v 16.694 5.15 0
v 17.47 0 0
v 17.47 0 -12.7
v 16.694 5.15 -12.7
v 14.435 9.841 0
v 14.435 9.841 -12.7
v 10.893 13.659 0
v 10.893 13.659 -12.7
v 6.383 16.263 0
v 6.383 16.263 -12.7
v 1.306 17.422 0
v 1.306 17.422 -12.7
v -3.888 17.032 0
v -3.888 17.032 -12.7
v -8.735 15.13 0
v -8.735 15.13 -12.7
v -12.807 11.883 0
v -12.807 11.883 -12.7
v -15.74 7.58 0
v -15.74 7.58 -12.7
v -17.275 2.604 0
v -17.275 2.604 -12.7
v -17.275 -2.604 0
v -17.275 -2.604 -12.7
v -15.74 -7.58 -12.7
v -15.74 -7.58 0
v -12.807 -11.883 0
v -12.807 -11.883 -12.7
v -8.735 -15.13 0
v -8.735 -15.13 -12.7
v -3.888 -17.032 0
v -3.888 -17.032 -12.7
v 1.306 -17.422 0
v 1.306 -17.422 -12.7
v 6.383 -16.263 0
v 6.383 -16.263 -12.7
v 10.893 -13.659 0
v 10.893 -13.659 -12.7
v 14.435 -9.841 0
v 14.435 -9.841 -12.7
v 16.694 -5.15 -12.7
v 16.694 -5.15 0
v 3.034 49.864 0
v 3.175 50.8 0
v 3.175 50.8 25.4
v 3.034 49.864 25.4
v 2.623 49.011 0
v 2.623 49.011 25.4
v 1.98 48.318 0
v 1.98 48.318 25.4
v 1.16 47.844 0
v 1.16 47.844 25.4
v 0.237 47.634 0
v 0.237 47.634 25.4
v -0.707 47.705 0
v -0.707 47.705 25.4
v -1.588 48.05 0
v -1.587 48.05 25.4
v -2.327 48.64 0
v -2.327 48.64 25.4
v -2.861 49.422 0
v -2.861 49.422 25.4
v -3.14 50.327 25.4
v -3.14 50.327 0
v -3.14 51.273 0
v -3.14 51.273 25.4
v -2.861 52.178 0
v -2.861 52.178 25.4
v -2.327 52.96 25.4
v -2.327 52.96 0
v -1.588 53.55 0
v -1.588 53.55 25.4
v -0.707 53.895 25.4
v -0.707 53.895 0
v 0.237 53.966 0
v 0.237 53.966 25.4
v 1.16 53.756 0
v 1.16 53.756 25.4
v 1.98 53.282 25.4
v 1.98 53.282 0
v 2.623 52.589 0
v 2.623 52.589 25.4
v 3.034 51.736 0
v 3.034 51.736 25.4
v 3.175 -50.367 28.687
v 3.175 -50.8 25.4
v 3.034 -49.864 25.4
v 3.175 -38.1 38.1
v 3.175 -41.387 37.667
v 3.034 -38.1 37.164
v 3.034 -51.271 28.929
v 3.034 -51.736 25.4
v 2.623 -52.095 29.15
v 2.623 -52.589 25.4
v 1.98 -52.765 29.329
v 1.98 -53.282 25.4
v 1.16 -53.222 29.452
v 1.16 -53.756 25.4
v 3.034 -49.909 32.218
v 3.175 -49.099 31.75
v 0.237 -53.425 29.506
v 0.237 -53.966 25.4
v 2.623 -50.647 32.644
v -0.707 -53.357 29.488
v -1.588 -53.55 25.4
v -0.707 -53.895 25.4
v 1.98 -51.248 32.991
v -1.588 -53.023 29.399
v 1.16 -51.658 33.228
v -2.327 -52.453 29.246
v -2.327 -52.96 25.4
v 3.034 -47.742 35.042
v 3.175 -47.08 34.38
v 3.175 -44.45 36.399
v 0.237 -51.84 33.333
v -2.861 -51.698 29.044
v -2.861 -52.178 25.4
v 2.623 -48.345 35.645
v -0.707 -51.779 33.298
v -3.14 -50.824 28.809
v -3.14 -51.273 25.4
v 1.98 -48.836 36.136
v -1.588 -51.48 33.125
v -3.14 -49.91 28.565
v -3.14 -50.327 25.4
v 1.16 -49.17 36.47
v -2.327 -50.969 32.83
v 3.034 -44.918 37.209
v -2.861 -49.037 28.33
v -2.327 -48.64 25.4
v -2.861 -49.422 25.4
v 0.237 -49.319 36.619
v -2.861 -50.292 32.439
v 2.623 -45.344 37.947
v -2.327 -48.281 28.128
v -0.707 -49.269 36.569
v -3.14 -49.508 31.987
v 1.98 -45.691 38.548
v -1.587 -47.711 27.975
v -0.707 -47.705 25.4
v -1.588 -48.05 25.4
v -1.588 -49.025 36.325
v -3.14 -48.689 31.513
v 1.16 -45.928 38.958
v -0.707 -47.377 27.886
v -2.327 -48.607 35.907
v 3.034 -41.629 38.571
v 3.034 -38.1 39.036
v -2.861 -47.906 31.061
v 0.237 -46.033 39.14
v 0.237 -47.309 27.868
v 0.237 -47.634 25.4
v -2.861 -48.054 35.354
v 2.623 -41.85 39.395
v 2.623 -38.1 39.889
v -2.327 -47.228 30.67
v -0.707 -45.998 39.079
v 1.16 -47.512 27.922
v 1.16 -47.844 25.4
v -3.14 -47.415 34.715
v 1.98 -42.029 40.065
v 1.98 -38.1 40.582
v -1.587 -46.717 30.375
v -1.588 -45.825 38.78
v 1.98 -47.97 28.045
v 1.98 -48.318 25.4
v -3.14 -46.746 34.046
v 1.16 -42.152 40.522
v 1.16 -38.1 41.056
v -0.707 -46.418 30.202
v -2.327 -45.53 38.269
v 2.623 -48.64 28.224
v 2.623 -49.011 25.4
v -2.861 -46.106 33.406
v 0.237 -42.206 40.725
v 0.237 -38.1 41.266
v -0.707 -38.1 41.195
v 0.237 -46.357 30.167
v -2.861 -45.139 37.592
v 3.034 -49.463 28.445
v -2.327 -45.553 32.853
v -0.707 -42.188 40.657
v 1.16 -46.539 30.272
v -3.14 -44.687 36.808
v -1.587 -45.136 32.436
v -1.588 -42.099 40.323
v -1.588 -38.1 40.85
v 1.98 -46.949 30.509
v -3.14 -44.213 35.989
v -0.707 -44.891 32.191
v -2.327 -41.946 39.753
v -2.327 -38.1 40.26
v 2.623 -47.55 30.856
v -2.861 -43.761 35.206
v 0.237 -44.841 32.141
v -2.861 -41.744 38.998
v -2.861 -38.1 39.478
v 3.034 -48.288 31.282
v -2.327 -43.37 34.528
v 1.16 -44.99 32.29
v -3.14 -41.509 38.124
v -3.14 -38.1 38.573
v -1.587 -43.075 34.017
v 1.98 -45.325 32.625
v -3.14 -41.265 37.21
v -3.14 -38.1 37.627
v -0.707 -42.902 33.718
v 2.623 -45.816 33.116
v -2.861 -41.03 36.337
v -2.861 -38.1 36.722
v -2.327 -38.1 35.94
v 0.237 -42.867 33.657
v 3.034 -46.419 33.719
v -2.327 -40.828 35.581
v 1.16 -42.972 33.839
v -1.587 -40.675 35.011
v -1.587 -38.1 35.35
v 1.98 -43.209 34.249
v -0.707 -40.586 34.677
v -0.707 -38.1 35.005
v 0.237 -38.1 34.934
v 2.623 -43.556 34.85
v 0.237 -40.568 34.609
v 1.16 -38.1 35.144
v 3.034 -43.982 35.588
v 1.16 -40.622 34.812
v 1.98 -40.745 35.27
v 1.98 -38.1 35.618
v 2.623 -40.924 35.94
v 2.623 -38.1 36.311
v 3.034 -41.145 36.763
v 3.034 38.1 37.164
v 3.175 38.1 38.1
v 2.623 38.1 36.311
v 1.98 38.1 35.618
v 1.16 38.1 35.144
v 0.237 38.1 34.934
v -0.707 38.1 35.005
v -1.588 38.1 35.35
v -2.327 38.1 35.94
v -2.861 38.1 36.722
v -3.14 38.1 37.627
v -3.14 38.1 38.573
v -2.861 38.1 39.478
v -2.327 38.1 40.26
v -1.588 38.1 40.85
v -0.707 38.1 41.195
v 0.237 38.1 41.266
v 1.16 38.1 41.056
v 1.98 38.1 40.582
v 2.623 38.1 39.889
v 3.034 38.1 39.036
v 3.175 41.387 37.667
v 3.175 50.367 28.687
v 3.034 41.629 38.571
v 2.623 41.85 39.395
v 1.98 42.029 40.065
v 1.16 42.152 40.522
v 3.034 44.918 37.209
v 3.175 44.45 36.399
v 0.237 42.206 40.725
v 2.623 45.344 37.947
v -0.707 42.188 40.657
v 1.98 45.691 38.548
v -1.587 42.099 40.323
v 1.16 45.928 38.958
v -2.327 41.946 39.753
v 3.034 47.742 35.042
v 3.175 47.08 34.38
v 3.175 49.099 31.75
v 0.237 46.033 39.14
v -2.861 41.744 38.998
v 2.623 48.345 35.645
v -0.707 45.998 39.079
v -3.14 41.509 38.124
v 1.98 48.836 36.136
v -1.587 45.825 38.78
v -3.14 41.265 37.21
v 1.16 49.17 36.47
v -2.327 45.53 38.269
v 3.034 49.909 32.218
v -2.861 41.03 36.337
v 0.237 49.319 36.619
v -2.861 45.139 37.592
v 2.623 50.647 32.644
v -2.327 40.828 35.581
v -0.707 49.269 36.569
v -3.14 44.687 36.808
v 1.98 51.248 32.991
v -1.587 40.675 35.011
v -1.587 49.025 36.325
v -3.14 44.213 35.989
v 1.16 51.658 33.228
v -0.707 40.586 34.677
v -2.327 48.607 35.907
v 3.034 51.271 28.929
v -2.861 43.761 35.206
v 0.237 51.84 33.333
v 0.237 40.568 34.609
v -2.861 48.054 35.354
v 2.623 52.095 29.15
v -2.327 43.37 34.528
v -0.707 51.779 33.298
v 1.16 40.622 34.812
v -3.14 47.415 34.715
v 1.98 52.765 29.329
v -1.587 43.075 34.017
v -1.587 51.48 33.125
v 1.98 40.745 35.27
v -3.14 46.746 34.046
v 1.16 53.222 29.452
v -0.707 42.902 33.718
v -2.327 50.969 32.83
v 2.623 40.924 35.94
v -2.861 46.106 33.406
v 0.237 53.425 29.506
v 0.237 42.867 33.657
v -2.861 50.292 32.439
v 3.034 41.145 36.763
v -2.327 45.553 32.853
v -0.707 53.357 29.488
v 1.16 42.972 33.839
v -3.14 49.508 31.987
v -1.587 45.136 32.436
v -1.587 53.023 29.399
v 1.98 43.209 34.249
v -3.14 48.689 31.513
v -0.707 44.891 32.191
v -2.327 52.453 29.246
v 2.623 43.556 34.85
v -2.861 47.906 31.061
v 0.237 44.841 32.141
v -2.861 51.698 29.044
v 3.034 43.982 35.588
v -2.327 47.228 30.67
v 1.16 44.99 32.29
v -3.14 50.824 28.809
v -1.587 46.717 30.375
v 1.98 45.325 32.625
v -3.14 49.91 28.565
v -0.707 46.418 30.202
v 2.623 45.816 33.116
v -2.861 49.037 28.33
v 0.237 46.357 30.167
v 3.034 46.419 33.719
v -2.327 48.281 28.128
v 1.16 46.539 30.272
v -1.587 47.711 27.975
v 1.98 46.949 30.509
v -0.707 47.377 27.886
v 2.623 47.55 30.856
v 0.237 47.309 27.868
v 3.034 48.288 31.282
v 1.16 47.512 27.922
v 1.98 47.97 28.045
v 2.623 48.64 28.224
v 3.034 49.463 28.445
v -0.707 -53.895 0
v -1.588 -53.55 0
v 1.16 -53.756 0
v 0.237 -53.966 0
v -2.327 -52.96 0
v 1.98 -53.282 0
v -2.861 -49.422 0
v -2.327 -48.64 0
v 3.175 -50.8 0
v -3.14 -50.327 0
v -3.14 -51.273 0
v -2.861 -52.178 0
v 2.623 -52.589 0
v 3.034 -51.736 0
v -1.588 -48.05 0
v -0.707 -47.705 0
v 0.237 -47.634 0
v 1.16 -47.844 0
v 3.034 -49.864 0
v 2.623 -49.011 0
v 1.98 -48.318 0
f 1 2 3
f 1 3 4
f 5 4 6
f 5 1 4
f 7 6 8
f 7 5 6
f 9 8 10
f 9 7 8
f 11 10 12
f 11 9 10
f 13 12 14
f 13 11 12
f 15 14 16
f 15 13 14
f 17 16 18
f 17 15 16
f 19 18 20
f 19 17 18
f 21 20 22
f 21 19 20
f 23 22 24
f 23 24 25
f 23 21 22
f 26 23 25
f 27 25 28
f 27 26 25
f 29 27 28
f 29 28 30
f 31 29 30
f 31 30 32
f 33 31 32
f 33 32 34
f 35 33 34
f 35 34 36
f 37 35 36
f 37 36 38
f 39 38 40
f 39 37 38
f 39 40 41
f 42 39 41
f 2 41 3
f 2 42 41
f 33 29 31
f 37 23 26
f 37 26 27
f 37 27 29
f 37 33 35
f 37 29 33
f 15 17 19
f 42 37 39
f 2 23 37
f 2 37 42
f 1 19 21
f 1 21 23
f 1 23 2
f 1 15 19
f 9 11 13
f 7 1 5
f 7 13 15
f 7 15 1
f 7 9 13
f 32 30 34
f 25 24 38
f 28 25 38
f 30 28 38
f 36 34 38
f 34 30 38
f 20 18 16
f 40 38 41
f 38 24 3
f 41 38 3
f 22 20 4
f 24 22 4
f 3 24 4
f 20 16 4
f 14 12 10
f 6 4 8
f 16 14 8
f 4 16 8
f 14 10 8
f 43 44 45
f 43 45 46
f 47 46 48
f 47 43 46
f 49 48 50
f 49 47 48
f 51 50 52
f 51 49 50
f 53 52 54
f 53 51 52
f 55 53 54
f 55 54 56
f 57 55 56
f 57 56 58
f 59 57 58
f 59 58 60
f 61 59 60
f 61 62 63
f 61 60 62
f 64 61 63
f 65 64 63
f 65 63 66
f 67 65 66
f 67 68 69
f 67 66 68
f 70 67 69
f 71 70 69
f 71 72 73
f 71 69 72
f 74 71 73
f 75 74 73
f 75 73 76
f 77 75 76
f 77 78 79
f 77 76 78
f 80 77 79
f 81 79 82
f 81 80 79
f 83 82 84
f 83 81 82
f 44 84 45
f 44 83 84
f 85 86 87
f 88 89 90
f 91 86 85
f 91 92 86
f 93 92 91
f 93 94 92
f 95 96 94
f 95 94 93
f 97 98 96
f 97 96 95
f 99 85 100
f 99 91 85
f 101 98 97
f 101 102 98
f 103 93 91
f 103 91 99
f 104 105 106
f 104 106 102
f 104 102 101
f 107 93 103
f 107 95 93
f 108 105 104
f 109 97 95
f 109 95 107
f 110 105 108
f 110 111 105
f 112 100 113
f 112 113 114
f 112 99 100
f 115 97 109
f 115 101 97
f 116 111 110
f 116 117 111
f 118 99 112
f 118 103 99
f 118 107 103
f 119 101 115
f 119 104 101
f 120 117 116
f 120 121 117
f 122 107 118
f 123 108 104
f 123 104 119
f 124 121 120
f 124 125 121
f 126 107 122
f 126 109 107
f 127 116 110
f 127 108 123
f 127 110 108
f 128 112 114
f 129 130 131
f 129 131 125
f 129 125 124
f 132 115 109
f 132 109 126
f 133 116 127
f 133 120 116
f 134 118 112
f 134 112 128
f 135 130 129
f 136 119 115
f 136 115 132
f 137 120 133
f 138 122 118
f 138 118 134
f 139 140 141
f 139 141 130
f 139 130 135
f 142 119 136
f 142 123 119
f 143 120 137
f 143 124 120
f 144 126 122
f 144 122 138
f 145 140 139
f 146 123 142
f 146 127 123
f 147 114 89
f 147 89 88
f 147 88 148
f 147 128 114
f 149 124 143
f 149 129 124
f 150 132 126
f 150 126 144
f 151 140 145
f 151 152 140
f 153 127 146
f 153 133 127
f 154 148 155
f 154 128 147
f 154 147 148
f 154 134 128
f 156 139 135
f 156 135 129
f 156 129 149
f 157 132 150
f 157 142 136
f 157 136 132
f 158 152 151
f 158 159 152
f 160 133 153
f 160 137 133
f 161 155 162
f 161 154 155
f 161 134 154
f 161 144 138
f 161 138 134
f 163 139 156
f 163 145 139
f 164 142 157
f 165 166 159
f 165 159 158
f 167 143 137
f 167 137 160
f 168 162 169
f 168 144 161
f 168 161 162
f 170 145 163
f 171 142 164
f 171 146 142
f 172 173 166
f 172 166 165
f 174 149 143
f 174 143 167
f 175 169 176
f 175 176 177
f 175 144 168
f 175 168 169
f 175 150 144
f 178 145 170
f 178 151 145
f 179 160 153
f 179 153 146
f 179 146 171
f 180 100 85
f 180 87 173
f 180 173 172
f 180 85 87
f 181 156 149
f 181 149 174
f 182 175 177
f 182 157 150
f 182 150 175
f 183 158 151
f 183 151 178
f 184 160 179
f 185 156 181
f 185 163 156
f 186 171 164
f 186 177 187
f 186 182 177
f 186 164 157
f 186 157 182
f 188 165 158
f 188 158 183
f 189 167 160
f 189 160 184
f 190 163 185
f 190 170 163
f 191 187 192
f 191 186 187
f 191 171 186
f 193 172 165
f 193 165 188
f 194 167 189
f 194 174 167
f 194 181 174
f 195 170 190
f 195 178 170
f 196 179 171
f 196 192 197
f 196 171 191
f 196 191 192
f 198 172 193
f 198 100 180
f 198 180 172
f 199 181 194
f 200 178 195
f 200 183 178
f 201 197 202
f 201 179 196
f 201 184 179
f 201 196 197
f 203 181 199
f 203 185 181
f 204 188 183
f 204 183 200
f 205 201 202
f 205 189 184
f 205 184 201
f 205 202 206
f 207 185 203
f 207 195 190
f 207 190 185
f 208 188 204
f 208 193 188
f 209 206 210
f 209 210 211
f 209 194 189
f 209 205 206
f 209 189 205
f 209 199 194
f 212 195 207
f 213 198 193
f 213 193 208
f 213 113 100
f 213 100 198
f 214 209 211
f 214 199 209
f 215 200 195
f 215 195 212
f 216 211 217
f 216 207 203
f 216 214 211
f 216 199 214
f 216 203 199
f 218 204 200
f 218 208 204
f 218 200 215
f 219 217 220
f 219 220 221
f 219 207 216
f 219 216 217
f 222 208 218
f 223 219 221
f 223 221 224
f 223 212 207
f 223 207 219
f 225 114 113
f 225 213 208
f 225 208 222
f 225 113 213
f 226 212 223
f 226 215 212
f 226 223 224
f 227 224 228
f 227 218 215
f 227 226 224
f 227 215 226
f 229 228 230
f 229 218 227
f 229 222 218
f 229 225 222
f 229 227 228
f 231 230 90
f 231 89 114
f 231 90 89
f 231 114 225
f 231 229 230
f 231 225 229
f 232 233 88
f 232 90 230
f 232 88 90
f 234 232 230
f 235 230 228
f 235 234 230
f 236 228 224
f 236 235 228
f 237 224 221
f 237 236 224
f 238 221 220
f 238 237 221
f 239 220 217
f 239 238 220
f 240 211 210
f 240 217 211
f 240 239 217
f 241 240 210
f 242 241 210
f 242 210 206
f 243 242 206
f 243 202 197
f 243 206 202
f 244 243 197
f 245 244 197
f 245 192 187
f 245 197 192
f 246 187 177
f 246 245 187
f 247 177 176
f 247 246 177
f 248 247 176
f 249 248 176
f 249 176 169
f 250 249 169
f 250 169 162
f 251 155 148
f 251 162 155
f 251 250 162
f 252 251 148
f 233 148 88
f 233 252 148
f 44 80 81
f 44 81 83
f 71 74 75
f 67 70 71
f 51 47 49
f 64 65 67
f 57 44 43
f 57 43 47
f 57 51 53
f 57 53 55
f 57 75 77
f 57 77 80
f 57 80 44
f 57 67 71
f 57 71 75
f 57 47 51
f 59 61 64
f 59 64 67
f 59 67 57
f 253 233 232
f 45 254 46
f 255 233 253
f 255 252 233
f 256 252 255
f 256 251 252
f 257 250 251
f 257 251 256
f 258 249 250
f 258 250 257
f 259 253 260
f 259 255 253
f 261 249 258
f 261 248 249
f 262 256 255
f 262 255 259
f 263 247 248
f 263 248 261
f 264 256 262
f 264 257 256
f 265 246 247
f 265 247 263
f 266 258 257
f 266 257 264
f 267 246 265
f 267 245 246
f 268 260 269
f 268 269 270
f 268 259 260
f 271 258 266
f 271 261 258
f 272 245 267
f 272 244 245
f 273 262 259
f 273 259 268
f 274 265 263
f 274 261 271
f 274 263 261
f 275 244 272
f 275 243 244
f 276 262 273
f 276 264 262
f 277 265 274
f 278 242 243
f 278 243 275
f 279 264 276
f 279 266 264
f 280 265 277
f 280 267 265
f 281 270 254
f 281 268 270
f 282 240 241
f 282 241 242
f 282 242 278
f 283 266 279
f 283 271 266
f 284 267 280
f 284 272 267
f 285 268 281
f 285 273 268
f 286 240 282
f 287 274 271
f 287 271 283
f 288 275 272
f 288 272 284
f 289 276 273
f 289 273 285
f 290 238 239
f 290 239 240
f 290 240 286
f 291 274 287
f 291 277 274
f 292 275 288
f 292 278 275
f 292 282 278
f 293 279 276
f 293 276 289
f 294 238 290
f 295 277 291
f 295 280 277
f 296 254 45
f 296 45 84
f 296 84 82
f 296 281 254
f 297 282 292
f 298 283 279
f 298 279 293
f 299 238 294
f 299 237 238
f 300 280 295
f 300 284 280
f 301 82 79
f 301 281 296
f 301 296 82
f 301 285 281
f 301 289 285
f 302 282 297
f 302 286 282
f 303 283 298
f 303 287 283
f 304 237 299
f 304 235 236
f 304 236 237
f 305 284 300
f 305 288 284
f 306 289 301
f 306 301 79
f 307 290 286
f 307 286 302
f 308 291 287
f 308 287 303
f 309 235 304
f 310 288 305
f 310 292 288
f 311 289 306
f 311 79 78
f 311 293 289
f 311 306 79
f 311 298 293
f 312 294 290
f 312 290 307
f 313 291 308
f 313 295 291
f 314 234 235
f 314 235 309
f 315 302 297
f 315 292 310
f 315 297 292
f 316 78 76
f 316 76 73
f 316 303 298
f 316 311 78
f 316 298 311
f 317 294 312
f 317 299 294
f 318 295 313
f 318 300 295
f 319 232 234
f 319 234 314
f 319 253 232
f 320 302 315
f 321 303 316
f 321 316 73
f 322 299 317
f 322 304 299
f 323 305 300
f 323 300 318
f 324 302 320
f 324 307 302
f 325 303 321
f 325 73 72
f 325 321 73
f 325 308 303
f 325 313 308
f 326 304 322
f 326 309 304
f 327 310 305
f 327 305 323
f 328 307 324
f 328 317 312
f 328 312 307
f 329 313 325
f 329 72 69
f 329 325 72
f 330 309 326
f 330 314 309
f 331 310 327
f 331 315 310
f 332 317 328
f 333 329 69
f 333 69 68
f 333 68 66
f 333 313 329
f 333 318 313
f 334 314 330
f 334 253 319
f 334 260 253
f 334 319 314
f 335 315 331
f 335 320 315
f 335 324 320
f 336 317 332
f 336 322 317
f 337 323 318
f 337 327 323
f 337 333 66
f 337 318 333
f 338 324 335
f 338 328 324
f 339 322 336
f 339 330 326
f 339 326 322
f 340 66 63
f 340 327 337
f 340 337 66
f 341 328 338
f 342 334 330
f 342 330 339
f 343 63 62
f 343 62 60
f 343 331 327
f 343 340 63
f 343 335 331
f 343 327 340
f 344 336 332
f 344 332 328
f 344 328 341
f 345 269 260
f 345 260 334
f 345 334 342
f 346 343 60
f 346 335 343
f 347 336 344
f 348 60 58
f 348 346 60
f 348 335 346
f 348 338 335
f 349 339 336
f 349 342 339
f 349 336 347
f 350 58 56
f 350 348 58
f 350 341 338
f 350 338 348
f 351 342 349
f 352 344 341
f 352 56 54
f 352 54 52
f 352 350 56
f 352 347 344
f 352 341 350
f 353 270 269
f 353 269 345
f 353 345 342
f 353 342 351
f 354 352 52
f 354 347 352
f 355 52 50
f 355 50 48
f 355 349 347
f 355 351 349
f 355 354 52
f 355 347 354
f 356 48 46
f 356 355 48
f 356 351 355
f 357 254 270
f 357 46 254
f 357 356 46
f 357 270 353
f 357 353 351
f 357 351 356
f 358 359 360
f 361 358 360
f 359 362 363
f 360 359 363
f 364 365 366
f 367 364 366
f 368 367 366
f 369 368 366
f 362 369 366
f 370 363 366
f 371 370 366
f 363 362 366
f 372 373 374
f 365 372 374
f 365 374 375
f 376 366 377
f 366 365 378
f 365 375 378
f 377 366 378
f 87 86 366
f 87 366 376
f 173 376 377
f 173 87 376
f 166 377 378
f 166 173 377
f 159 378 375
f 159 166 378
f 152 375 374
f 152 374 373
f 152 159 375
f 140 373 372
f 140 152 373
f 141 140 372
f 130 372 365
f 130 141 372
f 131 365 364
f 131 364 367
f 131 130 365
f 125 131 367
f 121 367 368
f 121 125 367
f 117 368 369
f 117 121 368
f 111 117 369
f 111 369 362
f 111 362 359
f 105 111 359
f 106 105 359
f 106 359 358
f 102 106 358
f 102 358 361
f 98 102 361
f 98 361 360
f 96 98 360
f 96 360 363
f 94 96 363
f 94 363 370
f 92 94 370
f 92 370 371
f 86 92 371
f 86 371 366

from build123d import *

# Parameters (mm, degrees)
F0_R     = 3.175
F3_R     = 17.47045
F4_DEPTH = 12.7


with BuildPart() as f2:
    # F2: sweep along a path in F1
    with BuildLine(Plane.YZ) as f2_path:
        Line((-50.8, 0), (-50.8, 25.4))
        ThreePointArc((-50.8, 25.4), (-47.080256, 34.380256), (-38.1, 38.1))
        Line((-38.1, 38.1), (38.1, 38.1))
        ThreePointArc((38.1, 38.1), (47.080256, 34.380256), (50.8, 25.4))
        Line((50.8, 25.4), (50.8, 0))
    # F0 (on Top) → F2 (sweep)
    with BuildSketch(Plane.XY):
        with Locations((0, -50.8)):
            Circle(F0_R)
    sweep(path=f2_path.line)


with BuildPart() as f4:
    # F3 (on Top) → F4 (new body)
    with BuildSketch(Plane.XY):
        Circle(F3_R)
    extrude(amount=-F4_DEPTH)


solid = Compound([f2.part, f4.part])
